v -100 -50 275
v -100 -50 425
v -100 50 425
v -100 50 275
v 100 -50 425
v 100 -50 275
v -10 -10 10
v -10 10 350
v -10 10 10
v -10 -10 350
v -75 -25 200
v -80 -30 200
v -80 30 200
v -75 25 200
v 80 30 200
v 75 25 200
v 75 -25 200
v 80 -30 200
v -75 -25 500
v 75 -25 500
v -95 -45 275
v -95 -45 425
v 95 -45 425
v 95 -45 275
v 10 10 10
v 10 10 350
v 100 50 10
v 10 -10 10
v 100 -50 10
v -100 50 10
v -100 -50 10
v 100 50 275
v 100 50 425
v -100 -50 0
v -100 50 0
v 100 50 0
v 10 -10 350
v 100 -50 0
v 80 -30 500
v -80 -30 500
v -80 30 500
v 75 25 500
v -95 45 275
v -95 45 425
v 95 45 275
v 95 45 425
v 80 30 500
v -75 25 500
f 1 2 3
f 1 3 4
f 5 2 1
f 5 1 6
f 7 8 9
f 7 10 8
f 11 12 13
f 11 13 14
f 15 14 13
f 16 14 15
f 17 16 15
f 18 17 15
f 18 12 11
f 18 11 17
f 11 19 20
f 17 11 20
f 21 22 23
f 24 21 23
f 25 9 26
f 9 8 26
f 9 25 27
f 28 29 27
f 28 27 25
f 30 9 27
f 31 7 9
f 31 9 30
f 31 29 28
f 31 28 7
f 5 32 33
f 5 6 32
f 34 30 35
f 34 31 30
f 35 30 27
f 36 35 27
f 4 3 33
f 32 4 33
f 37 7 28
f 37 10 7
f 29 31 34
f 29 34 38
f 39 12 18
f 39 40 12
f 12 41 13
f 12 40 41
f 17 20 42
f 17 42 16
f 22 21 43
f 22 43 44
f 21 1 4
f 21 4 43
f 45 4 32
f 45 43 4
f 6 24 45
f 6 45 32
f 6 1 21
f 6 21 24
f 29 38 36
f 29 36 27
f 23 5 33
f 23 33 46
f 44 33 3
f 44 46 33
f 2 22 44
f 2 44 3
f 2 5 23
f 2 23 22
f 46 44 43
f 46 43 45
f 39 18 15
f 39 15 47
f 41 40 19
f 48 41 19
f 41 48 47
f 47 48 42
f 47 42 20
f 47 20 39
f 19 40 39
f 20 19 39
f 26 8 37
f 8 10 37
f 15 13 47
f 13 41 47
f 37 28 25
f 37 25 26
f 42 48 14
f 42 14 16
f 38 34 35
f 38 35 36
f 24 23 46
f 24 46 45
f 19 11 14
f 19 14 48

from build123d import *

# Parameters (mm, degrees)
F0_W          = 20
F0_H          = 190
F0_H_2        = 5
F0_H_3        = 70
F1_DEPTH      = 10
F1_DEPTH_BACK = 10
F2_DEPTH      = 50
F3_START      = 45
F0_W_2        = 15
F0_W_3        = 75
F0_W_4        = 5
F0_H_4        = 140
F0_W_5        = 65
F3_DEPTH      = 5
F4_DEPTH      = 30
F5_START      = 25
F0_W_6        = 150
F5_DEPTH      = 5


with BuildPart() as f1:
    # F0 (on Front) → F1 (new body, two sides)
    with BuildSketch(Plane.XZ) as f1_sk:
        with Locations((0, 105)):
            Rectangle(F0_W, F0_H)
        with Locations((0, 202.5)):
            Rectangle(F0_W, F0_H_2)
        with Locations((0, 240)):
            Rectangle(F0_W, F0_H_3)
        with Locations((0, 277.5)):
            Rectangle(F0_W, F0_H_2)
        with Locations((0, 315)):
            Rectangle(F0_W, F0_H_3)
    extrude(amount=F1_DEPTH)
    extrude(f1_sk.sketch, amount=-F1_DEPTH_BACK)

    # F0 (on Front) → F2, piece 3 (join)
    with BuildSketch(Plane.XZ):
        Polygon((10, 10), (-10, 10), (-100, 10), (-100, 0), (100, 0), (100, 10), align=None)
    extrude(amount=F2_DEPTH)



with BuildPart() as f2:
    # F0 (on Front) → F2 (new body)
    with BuildSketch(Plane.XZ):
        Polygon((-95, 425), (-100, 425), (-100, 275), (-95, 275), (-95, 280), (-95, 420), align=None)
    extrude(amount=F2_DEPTH)



with BuildPart() as f2b:
    # F0 (on Front) → F2, piece 2 (new body)
    with BuildSketch(Plane.XZ):
        Polygon((100, 425), (95, 425), (95, 420), (95, 280), (95, 275), (100, 275), align=None)
    extrude(amount=F2_DEPTH)


with BuildPart() as f2_1:
    add(f2.part)

    add(f2b.part)  # F3 merges F2b
    # F0 (on Front) → F3 (join)
    with BuildSketch(Plane.XZ.offset(F3_START)):
        with Locations((87.5, 422.5)):
            Rectangle(F0_W_2, F0_H_2)
        with Locations((37.5, 422.5)):
            Rectangle(F0_W_3, F0_H_2)
        with Locations((77.5, 422.5)):
            Rectangle(F0_W_4, F0_H_2)
        with Locations((-37.5, 422.5)):
            Rectangle(F0_W_3, F0_H_2)
        with Locations((-87.5, 422.5)):
            Rectangle(F0_W_2, F0_H_2)
        with Locations((-77.5, 422.5)):
            Rectangle(F0_W_4, F0_H_2)
        with Locations((-87.5, 350)):
            Rectangle(F0_W_2, F0_H_4)
        with Locations((-77.5, 350)):
            Rectangle(F0_W_4, F0_H_4)
        with Locations((77.5, 350)):
            Rectangle(F0_W_4, F0_H_4)
        with Locations((87.5, 350)):
            Rectangle(F0_W_2, F0_H_4)
        Polygon((0, 420), (-75, 420), (-75, 280), (-10, 280), (-10, 350), (10, 350), (10, 280), (75, 280), (75, 420), align=None)
        with Locations((0, 315)):
            Rectangle(F0_W, F0_H_3)
        with Locations((87.5, 277.5)):
            Rectangle(F0_W_2, F0_H_2)
        with Locations((77.5, 277.5)):
            Rectangle(F0_W_4, F0_H_2)
        with Locations((42.5, 277.5)):
            Rectangle(F0_W_5, F0_H_2)
        with Locations((0, 277.5)):
            Rectangle(F0_W, F0_H_2)
        with Locations((-42.5, 277.5)):
            Rectangle(F0_W_5, F0_H_2)
        with Locations((-77.5, 277.5)):
            Rectangle(F0_W_4, F0_H_2)
        with Locations((-87.5, 277.5)):
            Rectangle(F0_W_2, F0_H_2)
    extrude(amount=F3_DEPTH)


with BuildPart() as f4:
    # F0 (on Front) → F4 (new body)
    with BuildSketch(Plane.XZ):
        Polygon((75, 495), (75, 425), (80, 425), (80, 500), (75, 500), align=None)
        with Locations((77.5, 422.5)):
            Rectangle(F0_W_4, F0_H_2)
        with Locations((77.5, 350)):
            Rectangle(F0_W_4, F0_H_4)
        with Locations((77.5, 277.5)):
            Rectangle(F0_W_4, F0_H_2)
        Polygon((80, 275), (75, 275), (75, 205), (75, 200), (80, 200), align=None)
    extrude(amount=F4_DEPTH)



with BuildPart() as f4b:
    # F0 (on Front) → F4, piece 2 (new body)
    with BuildSketch(Plane.XZ):
        Polygon((-75, 275), (-80, 275), (-80, 200), (-75, 200), (-75, 205), align=None)
        with Locations((-77.5, 277.5)):
            Rectangle(F0_W_4, F0_H_2)
        with Locations((-77.5, 350)):
            Rectangle(F0_W_4, F0_H_4)
        Polygon((-80, 500), (-80, 425), (-75, 425), (-75, 495), (-75, 500), align=None)
        with Locations((-77.5, 422.5)):
            Rectangle(F0_W_4, F0_H_2)
    extrude(amount=F4_DEPTH)


with BuildPart() as f4_1:
    add(f4.part)

    add(f4b.part)  # F5 merges F4b
    # F0 (on Front) → F5 (join)
    with BuildSketch(Plane.XZ.offset(F5_START)):
        with Locations((0, 497.5)):
            Rectangle(F0_W_6, F0_H_2)
        Polygon((-75, 495), (-75, 425), (0, 425), (75, 425), (75, 495), align=None)
        with Locations((37.5, 422.5)):
            Rectangle(F0_W_3, F0_H_2)
        with Locations((-37.5, 422.5)):
            Rectangle(F0_W_3, F0_H_2)
        Polygon((0, 420), (-75, 420), (-75, 280), (-10, 280), (-10, 350), (10, 350), (10, 280), (75, 280), (75, 420), align=None)
        with Locations((0, 315)):
            Rectangle(F0_W, F0_H_3)
        with Locations((0, 277.5)):
            Rectangle(F0_W, F0_H_2)
        with Locations((-42.5, 277.5)):
            Rectangle(F0_W_5, F0_H_2)
        with Locations((42.5, 277.5)):
            Rectangle(F0_W_5, F0_H_2)
        with Locations((42.5, 240)):
            Rectangle(F0_W_5, F0_H_3)
        with Locations((-42.5, 240)):
            Rectangle(F0_W_5, F0_H_3)
        with Locations((0, 240)):
            Rectangle(F0_W, F0_H_3)
        with Locations((42.5, 202.5)):
            Rectangle(F0_W_5, F0_H_2)
        with Locations((0, 202.5)):
            Rectangle(F0_W, F0_H_2)
        with Locations((-42.5, 202.5)):
            Rectangle(F0_W_5, F0_H_2)
    extrude(amount=F5_DEPTH)


with BuildPart() as f1_1:
    add(f1.part)

    add(f2_1.part)  # F6 merges F2

    add(f4_1.part)  # F6 merges F4
    # F6: F4, F2, F1 across plane
    add(f4_1.part.mirror(Plane.XZ))
    add(f2_1.part.mirror(Plane.XZ))
    add(f1.part.mirror(Plane.XZ))


solid = f1_1.part
